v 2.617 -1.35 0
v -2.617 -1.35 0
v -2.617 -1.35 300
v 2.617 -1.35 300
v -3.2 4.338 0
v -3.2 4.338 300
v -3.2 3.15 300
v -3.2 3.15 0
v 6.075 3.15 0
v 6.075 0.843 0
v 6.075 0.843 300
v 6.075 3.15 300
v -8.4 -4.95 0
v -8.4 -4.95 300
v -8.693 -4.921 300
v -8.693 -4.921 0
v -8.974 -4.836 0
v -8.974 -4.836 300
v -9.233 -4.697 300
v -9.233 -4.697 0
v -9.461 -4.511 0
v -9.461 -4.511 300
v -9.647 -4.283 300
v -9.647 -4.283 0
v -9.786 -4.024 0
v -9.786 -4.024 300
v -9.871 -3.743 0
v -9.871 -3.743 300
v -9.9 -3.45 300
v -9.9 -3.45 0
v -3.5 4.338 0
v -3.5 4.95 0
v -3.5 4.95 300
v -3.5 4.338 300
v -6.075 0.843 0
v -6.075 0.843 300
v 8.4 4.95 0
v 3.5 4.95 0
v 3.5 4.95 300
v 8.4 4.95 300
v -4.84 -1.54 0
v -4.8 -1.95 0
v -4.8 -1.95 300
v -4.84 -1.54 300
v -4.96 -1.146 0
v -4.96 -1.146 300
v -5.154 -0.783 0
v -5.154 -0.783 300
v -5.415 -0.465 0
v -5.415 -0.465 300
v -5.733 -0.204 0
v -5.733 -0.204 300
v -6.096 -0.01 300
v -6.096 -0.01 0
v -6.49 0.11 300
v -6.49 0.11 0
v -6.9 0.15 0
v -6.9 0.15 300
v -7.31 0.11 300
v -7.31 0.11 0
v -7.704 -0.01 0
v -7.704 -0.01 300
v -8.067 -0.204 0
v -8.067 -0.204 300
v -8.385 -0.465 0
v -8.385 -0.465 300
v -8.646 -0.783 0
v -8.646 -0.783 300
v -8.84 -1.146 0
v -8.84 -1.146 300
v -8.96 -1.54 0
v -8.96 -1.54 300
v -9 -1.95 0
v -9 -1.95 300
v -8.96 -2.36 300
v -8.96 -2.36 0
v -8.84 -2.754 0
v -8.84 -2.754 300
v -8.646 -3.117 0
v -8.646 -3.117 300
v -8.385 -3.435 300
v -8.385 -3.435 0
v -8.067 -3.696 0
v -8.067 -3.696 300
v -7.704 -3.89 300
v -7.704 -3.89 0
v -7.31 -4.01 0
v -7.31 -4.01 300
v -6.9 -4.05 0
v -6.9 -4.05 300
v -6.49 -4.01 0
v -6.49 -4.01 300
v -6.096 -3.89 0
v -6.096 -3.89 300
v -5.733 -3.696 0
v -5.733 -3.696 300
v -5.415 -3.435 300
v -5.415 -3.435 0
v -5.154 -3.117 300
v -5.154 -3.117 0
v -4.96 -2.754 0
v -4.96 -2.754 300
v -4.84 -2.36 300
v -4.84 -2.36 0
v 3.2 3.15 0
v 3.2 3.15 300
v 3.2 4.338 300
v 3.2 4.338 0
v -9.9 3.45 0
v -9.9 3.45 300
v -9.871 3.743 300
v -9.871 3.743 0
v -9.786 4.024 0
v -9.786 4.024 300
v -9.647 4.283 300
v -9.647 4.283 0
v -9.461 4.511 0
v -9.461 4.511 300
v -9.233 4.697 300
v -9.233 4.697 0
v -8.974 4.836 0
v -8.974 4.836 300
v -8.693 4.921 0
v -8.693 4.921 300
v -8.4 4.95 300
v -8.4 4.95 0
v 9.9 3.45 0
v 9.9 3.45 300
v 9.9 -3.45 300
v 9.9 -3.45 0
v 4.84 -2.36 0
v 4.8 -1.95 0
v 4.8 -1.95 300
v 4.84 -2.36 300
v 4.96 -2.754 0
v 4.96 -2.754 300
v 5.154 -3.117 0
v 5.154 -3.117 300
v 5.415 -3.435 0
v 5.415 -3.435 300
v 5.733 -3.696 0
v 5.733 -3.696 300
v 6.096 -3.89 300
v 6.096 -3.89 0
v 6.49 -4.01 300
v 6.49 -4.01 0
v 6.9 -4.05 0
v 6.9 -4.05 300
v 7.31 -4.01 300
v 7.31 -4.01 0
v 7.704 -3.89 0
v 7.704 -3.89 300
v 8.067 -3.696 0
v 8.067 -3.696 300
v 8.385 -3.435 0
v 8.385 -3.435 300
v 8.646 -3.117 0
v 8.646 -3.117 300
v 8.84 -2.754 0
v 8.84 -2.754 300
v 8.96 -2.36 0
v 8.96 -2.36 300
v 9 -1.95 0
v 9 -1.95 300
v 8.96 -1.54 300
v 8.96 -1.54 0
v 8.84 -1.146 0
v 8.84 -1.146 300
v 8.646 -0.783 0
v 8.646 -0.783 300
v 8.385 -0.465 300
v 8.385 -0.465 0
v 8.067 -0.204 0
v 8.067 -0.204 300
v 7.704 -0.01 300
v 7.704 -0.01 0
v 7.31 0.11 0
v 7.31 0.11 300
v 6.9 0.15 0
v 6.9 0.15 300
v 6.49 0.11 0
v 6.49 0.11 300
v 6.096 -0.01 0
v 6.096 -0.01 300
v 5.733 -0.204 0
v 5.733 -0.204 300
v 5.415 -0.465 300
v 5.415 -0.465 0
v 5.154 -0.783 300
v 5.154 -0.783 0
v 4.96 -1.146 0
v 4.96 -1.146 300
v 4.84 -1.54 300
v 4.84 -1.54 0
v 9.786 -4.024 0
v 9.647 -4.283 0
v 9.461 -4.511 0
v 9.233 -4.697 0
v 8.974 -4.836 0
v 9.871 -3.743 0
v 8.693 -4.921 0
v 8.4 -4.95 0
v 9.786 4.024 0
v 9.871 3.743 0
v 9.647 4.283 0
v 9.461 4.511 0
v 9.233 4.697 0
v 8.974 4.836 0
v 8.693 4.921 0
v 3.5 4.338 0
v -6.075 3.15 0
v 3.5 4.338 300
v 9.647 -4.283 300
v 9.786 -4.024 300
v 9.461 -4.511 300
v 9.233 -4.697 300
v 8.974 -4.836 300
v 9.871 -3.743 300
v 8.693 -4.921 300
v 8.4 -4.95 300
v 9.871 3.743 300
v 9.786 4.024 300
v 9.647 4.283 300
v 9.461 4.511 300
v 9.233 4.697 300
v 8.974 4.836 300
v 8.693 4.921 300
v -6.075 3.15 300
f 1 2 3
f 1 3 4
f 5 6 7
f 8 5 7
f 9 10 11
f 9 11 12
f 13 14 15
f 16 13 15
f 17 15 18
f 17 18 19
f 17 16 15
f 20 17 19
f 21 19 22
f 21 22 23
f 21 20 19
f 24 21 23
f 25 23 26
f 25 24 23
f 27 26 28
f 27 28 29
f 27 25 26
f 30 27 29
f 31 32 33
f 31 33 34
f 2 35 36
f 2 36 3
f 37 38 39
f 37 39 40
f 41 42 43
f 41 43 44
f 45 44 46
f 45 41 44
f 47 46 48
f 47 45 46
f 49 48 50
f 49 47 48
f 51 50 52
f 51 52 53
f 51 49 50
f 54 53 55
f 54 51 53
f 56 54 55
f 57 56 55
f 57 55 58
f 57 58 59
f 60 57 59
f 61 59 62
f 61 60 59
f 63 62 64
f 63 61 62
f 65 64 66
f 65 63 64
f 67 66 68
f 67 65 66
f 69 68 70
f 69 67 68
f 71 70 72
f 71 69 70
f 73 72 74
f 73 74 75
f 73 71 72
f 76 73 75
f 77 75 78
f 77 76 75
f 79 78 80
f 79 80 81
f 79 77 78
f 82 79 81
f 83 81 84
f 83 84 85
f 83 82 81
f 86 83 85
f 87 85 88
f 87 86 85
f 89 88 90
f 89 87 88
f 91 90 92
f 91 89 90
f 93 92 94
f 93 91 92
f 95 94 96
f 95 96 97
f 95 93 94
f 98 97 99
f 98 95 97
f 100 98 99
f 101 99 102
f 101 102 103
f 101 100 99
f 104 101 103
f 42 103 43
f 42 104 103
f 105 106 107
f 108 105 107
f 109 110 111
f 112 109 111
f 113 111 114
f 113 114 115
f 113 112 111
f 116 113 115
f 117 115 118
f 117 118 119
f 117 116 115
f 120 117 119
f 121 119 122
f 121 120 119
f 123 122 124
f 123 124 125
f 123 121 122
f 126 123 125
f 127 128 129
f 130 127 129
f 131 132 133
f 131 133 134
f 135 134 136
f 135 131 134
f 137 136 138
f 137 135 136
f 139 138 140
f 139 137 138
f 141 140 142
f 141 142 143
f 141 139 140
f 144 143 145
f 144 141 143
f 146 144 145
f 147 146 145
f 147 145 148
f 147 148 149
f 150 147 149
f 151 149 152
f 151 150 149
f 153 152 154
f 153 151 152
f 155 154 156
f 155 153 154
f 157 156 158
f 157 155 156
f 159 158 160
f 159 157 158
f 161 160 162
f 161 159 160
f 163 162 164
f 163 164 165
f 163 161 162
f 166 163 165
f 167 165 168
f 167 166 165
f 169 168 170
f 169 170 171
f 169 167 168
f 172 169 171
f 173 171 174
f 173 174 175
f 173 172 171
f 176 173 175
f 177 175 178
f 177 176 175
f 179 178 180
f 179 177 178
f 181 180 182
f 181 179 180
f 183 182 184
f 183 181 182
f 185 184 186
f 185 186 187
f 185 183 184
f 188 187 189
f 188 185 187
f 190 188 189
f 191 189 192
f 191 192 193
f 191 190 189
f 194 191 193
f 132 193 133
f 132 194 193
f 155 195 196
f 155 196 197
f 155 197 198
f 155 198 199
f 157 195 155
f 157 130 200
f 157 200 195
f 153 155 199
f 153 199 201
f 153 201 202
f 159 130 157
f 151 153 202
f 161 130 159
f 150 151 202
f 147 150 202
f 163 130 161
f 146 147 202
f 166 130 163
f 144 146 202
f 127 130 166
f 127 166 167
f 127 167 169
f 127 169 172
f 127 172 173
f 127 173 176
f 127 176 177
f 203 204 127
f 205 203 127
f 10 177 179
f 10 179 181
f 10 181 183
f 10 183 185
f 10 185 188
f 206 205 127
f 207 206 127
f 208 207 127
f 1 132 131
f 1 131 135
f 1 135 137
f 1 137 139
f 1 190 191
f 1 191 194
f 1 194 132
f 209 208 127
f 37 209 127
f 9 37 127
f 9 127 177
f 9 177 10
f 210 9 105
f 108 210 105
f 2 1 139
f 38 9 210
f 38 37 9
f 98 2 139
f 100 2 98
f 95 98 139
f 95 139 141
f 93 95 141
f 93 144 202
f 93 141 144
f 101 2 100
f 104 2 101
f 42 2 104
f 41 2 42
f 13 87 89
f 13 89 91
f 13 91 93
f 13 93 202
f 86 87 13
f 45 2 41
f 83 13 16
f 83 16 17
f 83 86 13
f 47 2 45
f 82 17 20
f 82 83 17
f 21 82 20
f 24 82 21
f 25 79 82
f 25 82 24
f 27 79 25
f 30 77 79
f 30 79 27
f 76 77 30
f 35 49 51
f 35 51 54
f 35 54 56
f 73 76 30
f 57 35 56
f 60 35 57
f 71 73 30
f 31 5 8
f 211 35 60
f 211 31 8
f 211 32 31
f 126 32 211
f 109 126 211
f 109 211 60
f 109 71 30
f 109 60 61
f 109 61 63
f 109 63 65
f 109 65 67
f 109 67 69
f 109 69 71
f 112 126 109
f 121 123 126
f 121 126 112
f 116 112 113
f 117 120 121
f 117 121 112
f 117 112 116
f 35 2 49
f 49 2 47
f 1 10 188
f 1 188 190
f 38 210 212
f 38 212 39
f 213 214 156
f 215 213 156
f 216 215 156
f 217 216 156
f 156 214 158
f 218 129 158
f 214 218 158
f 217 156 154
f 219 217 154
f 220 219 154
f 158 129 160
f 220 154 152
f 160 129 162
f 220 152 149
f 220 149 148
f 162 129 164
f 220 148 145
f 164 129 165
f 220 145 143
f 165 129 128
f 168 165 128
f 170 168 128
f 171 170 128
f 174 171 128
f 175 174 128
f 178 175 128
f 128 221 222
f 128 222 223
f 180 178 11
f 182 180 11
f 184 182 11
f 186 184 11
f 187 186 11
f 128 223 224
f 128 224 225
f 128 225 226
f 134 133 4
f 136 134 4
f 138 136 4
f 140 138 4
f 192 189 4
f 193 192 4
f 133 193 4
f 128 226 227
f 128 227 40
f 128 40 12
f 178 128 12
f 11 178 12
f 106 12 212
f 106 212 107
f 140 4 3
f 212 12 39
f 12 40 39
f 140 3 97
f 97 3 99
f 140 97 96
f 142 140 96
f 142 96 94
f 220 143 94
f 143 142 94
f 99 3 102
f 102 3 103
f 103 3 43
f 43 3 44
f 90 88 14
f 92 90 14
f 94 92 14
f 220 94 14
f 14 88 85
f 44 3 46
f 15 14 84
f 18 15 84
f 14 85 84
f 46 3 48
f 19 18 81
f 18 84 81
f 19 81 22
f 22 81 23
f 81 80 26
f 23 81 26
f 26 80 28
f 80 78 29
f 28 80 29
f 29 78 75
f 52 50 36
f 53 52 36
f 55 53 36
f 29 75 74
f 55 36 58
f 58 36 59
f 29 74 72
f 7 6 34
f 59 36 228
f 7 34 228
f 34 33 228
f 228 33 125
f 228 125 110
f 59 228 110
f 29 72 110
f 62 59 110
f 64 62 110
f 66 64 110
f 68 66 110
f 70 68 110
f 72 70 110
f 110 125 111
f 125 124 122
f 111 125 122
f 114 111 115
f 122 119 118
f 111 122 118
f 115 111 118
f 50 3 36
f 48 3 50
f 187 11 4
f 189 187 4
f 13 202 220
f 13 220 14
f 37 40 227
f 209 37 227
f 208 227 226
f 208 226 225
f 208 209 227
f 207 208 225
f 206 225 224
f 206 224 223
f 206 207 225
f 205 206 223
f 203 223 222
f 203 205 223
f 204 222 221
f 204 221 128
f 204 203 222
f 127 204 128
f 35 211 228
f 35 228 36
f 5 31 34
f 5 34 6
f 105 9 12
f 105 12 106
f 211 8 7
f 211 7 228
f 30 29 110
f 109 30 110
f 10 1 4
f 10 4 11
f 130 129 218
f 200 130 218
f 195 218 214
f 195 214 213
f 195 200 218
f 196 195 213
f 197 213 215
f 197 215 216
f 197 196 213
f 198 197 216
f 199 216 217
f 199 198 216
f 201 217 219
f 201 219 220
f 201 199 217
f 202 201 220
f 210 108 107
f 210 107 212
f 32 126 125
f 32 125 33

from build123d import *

# Parameters (mm, degrees)
SKETCH_1_R      = 2.1
EXTRUDE_1_DEPTH = 300


with BuildPart() as part:
    # 草图1 → 凸台-拉伸1 (new body)
    with BuildSketch(Plane.XY):
        with BuildLine():
            Line((8.4, -4.95), (-8.4, -4.95))
            ThreePointArc((-8.4, -4.95), (-9.460660172, -4.510660172), (-9.9, -3.45))
            Line((-9.9, -3.45), (-9.9, 3.45))
            ThreePointArc((-9.9, 3.45), (-9.460660172, 4.510660172), (-8.4, 4.95))
            Line((-8.4, 4.95), (-3.5, 4.95))
            Line((-3.5, 4.95), (-3.5, 4.338498403))
            Line((-3.5, 4.338498403), (-3.2, 4.338498403))
            Line((-3.2, 4.338498403), (-3.2, 3.15))
            Line((-3.2, 3.15), (-6.074788311, 3.15))
            Line((-6.074788311, 3.15), (-6.074788311, 0.842971246))
            Line((-6.074788311, 0.842971246), (-2.616641346, -1.35))
            Line((-2.616641346, -1.35), (2.616641346, -1.35))
            Line((2.616641346, -1.35), (6.074788311, 0.842971246))
            Line((6.074788311, 0.842971246), (6.074788311, 3.15))
            Line((6.074788311, 3.15), (3.2, 3.15))
            Line((3.2, 3.15), (3.2, 4.338498403))
            Line((3.2, 4.338498403), (3.5, 4.338498403))
            Line((3.5, 4.338498403), (3.5, 4.95))
            Line((3.5, 4.95), (8.4, 4.95))
            ThreePointArc((8.4, 4.95), (9.460660172, 4.510660172), (9.9, 3.45))
            Line((9.9, 3.45), (9.9, -3.45))
            ThreePointArc((9.9, -3.45), (9.460660172, -4.510660172), (8.4, -4.95))
        make_face()
        with Locations((-6.9, -1.95)):
            Circle(SKETCH_1_R, mode=Mode.SUBTRACT)
        with Locations(Location((6.9, -1.95, 0), (0, 0, 180))):
            Circle(SKETCH_1_R, mode=Mode.SUBTRACT)
    extrude(amount=EXTRUDE_1_DEPTH)


solid = part.part
